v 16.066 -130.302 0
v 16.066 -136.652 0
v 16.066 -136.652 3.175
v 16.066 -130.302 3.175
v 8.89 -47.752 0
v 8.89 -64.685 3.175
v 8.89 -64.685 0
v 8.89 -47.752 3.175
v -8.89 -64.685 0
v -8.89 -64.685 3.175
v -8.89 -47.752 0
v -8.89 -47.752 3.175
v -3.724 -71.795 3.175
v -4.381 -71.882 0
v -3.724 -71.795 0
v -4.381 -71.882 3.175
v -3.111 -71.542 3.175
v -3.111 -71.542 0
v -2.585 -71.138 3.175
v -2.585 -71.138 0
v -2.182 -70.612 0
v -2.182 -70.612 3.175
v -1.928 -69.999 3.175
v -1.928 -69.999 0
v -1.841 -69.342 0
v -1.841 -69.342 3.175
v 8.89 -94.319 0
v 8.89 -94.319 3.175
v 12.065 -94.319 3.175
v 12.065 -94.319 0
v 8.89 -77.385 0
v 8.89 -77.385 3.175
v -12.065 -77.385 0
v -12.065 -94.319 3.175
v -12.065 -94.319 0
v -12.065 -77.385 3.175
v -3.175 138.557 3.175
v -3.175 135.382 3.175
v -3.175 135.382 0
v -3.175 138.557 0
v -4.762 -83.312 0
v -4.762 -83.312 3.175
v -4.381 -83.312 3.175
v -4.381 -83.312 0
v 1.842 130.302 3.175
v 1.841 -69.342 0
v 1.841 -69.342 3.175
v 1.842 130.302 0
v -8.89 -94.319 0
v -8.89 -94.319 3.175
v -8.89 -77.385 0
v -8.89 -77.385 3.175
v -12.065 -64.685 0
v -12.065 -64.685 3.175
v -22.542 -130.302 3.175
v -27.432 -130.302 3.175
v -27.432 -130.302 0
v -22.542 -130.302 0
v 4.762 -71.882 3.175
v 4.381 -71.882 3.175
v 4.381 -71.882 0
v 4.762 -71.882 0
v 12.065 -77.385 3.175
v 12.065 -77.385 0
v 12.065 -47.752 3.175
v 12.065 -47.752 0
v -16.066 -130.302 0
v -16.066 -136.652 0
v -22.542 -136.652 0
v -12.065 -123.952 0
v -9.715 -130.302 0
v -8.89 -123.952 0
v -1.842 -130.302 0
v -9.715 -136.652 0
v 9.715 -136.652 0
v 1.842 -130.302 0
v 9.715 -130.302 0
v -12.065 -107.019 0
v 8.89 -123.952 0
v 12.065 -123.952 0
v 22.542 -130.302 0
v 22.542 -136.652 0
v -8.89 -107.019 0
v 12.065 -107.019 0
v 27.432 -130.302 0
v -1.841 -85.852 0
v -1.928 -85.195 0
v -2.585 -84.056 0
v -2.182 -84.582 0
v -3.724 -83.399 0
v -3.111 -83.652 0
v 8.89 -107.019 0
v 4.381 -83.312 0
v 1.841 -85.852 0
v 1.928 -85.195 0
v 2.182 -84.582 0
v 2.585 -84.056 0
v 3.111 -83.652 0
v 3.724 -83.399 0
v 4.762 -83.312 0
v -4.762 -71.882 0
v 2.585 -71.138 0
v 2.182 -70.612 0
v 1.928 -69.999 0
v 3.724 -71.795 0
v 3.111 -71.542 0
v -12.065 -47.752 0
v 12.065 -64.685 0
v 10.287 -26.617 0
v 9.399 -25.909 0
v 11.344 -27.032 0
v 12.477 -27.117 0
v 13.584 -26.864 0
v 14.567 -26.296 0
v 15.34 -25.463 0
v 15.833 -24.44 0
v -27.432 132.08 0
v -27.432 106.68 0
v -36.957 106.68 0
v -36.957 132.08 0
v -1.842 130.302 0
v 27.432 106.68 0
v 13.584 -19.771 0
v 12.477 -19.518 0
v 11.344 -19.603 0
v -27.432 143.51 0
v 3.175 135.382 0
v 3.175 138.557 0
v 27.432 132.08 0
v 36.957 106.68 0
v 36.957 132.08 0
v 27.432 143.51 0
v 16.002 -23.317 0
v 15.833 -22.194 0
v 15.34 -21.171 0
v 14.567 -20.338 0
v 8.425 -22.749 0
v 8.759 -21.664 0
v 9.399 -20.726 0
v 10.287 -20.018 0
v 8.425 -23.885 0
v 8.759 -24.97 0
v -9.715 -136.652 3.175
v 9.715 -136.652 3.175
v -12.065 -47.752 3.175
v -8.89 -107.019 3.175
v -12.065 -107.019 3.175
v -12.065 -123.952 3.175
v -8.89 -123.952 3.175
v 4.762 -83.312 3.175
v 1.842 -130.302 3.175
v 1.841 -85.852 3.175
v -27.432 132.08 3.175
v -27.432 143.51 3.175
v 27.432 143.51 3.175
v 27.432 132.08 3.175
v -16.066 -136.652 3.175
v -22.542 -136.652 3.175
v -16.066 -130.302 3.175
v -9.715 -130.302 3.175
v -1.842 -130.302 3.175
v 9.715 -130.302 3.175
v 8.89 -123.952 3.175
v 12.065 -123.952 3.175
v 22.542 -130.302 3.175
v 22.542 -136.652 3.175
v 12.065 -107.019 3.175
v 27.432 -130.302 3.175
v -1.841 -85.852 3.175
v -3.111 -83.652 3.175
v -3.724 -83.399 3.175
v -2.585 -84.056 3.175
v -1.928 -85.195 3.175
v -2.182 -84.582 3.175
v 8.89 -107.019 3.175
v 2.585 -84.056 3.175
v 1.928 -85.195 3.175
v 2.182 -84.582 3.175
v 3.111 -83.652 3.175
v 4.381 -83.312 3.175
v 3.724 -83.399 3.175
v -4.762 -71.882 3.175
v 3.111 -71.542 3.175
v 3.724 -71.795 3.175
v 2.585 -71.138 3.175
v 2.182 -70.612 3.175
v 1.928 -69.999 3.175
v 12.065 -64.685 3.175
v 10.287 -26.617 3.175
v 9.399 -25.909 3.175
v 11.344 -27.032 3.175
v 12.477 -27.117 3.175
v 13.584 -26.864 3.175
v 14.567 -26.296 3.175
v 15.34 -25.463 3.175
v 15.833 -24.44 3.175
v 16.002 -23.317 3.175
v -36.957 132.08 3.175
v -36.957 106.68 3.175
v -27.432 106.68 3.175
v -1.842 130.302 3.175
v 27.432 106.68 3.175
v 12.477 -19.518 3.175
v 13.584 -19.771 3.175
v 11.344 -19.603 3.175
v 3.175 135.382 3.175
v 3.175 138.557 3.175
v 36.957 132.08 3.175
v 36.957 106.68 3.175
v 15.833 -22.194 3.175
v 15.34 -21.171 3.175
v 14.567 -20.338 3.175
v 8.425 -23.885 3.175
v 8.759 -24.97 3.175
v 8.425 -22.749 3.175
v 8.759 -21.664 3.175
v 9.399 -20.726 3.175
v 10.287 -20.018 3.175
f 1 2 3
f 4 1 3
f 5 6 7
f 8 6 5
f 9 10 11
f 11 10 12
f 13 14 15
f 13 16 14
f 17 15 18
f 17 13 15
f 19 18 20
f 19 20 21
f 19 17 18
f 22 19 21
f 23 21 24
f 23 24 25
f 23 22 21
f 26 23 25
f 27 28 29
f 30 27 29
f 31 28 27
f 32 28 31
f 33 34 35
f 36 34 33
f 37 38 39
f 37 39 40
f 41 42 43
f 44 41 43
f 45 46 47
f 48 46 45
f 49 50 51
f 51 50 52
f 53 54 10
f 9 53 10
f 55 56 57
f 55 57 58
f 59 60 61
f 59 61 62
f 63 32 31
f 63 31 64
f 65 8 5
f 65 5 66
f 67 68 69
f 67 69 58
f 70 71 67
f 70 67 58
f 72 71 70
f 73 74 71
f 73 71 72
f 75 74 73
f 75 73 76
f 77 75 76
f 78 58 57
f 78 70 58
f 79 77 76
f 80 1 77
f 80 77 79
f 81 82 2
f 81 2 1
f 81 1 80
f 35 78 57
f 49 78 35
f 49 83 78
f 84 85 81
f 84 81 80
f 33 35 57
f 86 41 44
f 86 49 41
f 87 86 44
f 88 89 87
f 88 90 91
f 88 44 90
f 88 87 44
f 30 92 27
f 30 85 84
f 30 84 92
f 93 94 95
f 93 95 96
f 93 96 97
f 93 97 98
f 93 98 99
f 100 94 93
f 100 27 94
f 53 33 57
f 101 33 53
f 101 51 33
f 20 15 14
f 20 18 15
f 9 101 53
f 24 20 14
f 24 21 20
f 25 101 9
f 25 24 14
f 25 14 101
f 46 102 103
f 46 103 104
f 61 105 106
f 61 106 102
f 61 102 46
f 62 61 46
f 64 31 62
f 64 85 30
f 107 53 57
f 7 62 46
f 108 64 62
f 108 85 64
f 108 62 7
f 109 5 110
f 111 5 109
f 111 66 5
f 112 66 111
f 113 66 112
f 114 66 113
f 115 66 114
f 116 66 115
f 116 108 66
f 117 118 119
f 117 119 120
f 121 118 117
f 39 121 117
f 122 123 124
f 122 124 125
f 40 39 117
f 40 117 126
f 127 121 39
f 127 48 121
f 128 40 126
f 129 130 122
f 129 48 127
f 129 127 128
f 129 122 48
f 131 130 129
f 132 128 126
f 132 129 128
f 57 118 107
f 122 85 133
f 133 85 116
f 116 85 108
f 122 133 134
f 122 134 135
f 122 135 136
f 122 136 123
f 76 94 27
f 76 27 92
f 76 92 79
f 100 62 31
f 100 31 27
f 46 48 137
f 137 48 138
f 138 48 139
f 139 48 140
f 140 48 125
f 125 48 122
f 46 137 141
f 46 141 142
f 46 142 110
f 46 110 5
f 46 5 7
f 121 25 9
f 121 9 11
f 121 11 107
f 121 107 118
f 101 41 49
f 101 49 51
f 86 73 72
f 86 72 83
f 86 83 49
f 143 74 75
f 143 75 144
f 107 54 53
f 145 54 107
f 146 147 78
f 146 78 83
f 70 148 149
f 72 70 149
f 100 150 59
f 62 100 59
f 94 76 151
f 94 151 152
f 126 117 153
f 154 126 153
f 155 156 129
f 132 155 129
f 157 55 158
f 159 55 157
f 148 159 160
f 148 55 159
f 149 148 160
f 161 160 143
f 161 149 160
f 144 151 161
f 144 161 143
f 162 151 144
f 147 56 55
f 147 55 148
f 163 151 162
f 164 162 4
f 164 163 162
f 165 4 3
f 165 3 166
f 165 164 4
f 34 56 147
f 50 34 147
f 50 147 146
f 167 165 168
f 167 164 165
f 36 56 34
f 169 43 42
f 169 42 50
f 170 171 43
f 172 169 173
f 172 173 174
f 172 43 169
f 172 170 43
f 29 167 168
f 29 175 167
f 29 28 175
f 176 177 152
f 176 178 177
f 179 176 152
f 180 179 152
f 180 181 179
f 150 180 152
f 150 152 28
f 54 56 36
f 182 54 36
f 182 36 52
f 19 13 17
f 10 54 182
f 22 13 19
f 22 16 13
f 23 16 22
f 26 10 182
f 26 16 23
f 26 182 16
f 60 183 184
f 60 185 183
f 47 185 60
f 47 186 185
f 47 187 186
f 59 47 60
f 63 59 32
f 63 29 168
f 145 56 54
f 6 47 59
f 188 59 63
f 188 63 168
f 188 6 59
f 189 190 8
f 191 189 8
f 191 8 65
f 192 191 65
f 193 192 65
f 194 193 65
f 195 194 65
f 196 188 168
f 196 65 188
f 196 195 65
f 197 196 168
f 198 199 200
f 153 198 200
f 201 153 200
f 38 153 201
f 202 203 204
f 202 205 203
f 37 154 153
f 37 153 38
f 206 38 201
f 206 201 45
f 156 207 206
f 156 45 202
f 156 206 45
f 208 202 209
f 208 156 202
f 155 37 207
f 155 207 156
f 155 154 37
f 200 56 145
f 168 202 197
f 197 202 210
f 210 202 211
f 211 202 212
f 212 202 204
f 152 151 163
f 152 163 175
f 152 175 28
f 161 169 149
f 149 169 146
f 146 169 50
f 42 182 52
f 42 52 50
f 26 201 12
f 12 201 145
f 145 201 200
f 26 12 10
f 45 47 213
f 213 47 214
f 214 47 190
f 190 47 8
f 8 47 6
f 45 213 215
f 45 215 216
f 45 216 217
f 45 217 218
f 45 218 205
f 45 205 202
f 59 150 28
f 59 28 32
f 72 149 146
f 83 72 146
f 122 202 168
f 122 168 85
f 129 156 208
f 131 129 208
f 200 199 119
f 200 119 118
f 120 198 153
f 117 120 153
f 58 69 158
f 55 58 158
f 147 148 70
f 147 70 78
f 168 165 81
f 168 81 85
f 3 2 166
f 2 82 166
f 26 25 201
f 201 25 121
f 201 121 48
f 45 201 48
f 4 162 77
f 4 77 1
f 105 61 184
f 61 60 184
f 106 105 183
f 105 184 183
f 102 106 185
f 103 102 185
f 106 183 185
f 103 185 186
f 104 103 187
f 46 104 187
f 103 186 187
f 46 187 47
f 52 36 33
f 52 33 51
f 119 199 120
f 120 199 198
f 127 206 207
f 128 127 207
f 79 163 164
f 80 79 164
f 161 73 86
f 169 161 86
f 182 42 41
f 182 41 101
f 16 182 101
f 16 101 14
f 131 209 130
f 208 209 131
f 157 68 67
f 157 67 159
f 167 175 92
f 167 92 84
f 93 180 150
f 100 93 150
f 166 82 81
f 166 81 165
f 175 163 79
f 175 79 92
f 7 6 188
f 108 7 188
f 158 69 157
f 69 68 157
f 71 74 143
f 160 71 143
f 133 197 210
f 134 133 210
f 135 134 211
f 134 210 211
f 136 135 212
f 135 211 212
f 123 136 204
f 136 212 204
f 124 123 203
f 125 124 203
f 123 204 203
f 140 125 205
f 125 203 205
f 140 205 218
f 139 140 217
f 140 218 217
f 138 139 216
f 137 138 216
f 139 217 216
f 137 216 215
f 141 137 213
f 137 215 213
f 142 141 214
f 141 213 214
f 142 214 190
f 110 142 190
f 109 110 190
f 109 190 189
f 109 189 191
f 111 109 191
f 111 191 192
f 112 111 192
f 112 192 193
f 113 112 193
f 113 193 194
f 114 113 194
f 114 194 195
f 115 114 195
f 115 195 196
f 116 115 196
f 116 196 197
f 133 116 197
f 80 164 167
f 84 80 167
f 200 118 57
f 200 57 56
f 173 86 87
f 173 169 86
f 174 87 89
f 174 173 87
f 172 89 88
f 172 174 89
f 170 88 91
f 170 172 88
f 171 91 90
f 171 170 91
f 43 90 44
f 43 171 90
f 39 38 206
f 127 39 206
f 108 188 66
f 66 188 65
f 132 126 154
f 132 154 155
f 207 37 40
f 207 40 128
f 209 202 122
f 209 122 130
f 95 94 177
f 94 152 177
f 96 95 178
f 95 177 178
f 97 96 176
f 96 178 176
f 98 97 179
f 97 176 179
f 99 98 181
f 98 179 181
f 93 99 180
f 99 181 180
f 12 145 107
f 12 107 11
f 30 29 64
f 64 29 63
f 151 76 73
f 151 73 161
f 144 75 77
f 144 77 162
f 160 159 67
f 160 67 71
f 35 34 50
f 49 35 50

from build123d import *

# Parameters (mm, degrees)
SKETCH1_W           = 54.864
SKETCH1_H           = 280.162
SKETCH1_W_2         = 3.683
SKETCH1_H_2         = 260.604
BOSS_EXTRUDE1_DEPTH = 3.175
SKETCH2_W           = 3.175
SKETCH2_H           = 101.6
BOSS_EXTRUDE2_DEPTH = 3.175
SKETCH3_W           = 225.425
SKETCH3_H           = 6.35
BOSS_EXTRUDE3_DEPTH = 51.689
SKETCH7_W           = 327.022738736
SKETCH7_H           = 279.435650021
CUT_EXTRUDE1_DEPTH  = 55.864
SKETCH4_W           = 6.35
SKETCH4_H           = 3.175
SKETCH4_W_2         = 4.8895
SKETCH4_H_2         = 12.7
CUT_EXTRUDE2_DEPTH  = 6.35
SKETCH8_W           = 9.525
SKETCH8_H           = 25.4
BOSS_EXTRUDE4_DEPTH = 3.175
SKETCH9_W           = 3.175
SKETCH9_H           = 16.933333333
SKETCH9_H_2         = 16.933333334
CUT_EXTRUDE4_DEPTH  = 4.175
SKETCH10_W          = 6.35
SKETCH10_H          = 3.175
CUT_EXTRUDE5_DEPTH  = 4.175
SKETCH13_W          = 9.525
SKETCH13_H          = 11.43
CUT_EXTRUDE7_DEPTH  = 4.175
SKETCH14_R          = 3.81
CUT_EXTRUDE8_DEPTH  = 4.175
FILLET1_R           = 2.54


with BuildPart() as part:
    # Sketch1 → Boss-Extrude1 (new body)
    with BuildSketch(Plane.XY):
        with Locations((0, 3.429)):
            Rectangle(SKETCH1_W, SKETCH1_H)
        Rectangle(SKETCH1_W_2, SKETCH1_H_2, mode=Mode.SUBTRACT)
    extrude(amount=BOSS_EXTRUDE1_DEPTH)

    # Sketch2 → Boss-Extrude2 (add)
    with BuildSketch(Plane(origin=(27.432, 0, 0), x_dir=(0, 0, -1), z_dir=(1, 0, 0))):
        Polygon((225.425, -47.752), (225.425, -35.052), (0, -35.052), (0, -136.652), (225.425, -136.652), (225.425, -123.952), (228.6, -123.952), (228.6, -107.018666667), (225.425, -107.018666667), (225.425, -94.318666667), (228.6, -94.318666667), (228.6, -77.385333333), (225.425, -77.385333333), (225.425, -64.685333333), (228.6, -64.685333333), (228.6, -47.752), align=None)
        with BuildLine():
            ThreePointArc((11.4, -103.892), (9.9, -105.392), (8.4, -103.892))
            Line((8.4, -103.892), (8.4, -98.812))
            ThreePointArc((8.4, -98.812), (9.9, -97.312), (11.4, -98.812))
            Line((11.4, -98.812), (11.4, -103.892))
        make_face(mode=Mode.SUBTRACT)
        with BuildLine():
            Line((42.4, -98.812), (42.4, -103.892))
            ThreePointArc((42.4, -103.892), (40.9, -105.392), (39.4, -103.892))
            Line((39.4, -103.892), (39.4, -98.812))
            ThreePointArc((39.4, -98.812), (40.9, -97.312), (42.4, -98.812))
        make_face(mode=Mode.SUBTRACT)
        with BuildLine():
            ThreePointArc((36.4, -88.392), (25.4, -99.392), (14.4, -88.392))
            Line((14.4, -88.392), (14.4, -83.312))
            ThreePointArc((14.4, -83.312), (25.4, -72.312), (36.4, -83.312))
            Line((36.4, -83.312), (36.4, -88.392))
        make_face(mode=Mode.SUBTRACT)
        with BuildLine():
            ThreePointArc((11.4, -72.892), (9.9, -74.392), (8.4, -72.892))
            Line((8.4, -72.892), (8.4, -67.812))
            ThreePointArc((8.4, -67.812), (9.9, -66.312), (11.4, -67.812))
            Line((11.4, -67.812), (11.4, -72.892))
        make_face(mode=Mode.SUBTRACT)
        with BuildLine():
            ThreePointArc((42.4, -72.892), (40.9, -74.392), (39.4, -72.892))
            Line((39.4, -72.892), (39.4, -67.812))
            ThreePointArc((39.4, -67.812), (40.9, -66.312), (42.4, -67.812))
            Line((42.4, -67.812), (42.4, -72.892))
        make_face(mode=Mode.SUBTRACT)
        with Locations((-1.5875, -85.852)):
            Rectangle(SKETCH2_W, SKETCH2_H)
    extrude(amount=-BOSS_EXTRUDE2_DEPTH)

    # Sketch3 → Boss-Extrude3 (add)
    with BuildSketch(Plane.ZY.offset(-24.257)):
        with Locations((-112.7125, -133.477)):
            Rectangle(SKETCH3_W, SKETCH3_H)
    extrude(amount=BOSS_EXTRUDE3_DEPTH)

    # Sketch7 → Cut-Extrude1 (cut, through all)
    with BuildSketch(Plane(origin=(27.432, 0, 0), x_dir=(0, 0, -1), z_dir=(1, 0, 0))):
        with Locations((163.511369368, -148.348068682)):
            Rectangle(SKETCH7_W, SKETCH7_H)
    extrude(amount=-CUT_EXTRUDE1_DEPTH, mode=Mode.SUBTRACT)

    # Sketch4 → Cut-Extrude2 (cut)
    with BuildSketch(Plane.XZ.offset(136.652)):
        with Locations((-12.8905, 1.5875)):
            Rectangle(SKETCH4_W, SKETCH4_H)
        with Locations((24.98725, 1.5875)):
            Rectangle(SKETCH4_W_2, SKETCH4_H)
        with Locations((-24.98725, 1.5875)):
            Rectangle(SKETCH4_W_2, SKETCH4_H)
        with Locations((12.8905, 1.5875)):
            Rectangle(SKETCH4_W, SKETCH4_H)
        with Locations((24.98725, -138.1125)):
            Rectangle(SKETCH4_W_2, SKETCH4_H_2)
        with Locations((24.98725, -57.15)):
            Rectangle(SKETCH4_W_2, SKETCH4_H_2)
        with Locations((24.98725, -165.1)):
            Rectangle(SKETCH4_W_2, SKETCH4_H_2)
    extrude(amount=-CUT_EXTRUDE2_DEPTH, mode=Mode.SUBTRACT)

    # Sketch8 → Boss-Extrude4 (add)
    with BuildSketch(Plane.XY.offset(3.175)):
        with Locations((-32.1945, 119.38)):
            Rectangle(SKETCH8_W, SKETCH8_H)
        with Locations((32.1945, 119.38)):
            Rectangle(SKETCH8_W, SKETCH8_H)
    extrude(amount=-BOSS_EXTRUDE4_DEPTH)

    # Sketch9 → Cut-Extrude4 (cut, through all)
    with BuildSketch(Plane.XY.offset(3.175)):
        with Locations((-10.4775, -56.218666666)):
            Rectangle(SKETCH9_W, SKETCH9_H)
        with Locations((-10.4775, -85.852)):
            Rectangle(SKETCH9_W, SKETCH9_H_2)
        with Locations((-10.4775, -115.485333334)):
            Rectangle(SKETCH9_W, SKETCH9_H)
        with Locations((10.4775, -56.218666666)):
            Rectangle(SKETCH9_W, SKETCH9_H)
        with Locations((10.4775, -85.852)):
            Rectangle(SKETCH9_W, SKETCH9_H_2)
        with Locations((10.4775, -115.485333334)):
            Rectangle(SKETCH9_W, SKETCH9_H)
    extrude(amount=-CUT_EXTRUDE4_DEPTH, mode=Mode.SUBTRACT)

    # Sketch10 → Cut-Extrude5 (cut, through all)
    with BuildSketch(Plane.XY.offset(3.175)):
        with Locations((0, 136.9695)):
            Rectangle(SKETCH10_W, SKETCH10_H)
    extrude(amount=-CUT_EXTRUDE5_DEPTH, mode=Mode.SUBTRACT)

    # Sketch13 → Cut-Extrude7 (cut, through all)
    with BuildSketch(Plane.XY.offset(3.175)):
        with Locations((0, -77.597)):
            Rectangle(SKETCH13_W, SKETCH13_H)
    extrude(amount=-CUT_EXTRUDE7_DEPTH, mode=Mode.SUBTRACT)

    # Sketch14 → Cut-Extrude8 (cut, through all)
    with BuildSketch(Plane.XY.offset(3.175)):
        with Locations((12.192, -23.3172)):
            Circle(SKETCH14_R)
    extrude(amount=-CUT_EXTRUDE8_DEPTH, mode=Mode.SUBTRACT)

    # Fillet1
    fillet1_edges = [part.edges().sort_by_distance(p)[0] for p in [
        (-1.8415, -83.312, 1.5875),
        (-1.8415, -71.882, 1.5875),
        (1.8415, -71.882, 1.5875),
        (1.8415, -83.312, 1.5875),
    ]]
    fillet(fillet1_edges, radius=FILLET1_R)


solid = part.part
